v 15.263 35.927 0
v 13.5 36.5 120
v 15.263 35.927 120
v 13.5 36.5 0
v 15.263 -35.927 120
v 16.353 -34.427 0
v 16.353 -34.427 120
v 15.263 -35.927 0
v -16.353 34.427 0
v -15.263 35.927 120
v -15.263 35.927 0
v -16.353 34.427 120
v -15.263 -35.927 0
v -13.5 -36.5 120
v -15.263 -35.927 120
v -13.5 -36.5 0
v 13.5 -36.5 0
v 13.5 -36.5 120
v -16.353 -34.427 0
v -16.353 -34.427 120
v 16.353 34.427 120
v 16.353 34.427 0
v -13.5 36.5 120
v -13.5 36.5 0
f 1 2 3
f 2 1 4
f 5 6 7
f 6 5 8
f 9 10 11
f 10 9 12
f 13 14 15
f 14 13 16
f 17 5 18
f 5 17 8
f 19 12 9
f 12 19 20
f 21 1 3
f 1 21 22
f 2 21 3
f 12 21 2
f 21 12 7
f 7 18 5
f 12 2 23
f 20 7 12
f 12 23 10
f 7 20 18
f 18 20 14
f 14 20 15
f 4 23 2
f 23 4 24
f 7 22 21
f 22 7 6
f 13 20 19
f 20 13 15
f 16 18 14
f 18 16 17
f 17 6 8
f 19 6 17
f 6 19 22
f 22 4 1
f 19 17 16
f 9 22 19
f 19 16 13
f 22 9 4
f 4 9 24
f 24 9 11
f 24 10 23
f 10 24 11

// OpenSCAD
// file: roundbox.scad
module roundedRectUp(size, radius)
{
    x = size[0];
    y = size[1];
    z = size[2];

    linear_extrude(height=z)
    hull()
    {
        // place 4 circles in the corners, with the given radius
        translate([(-x/2)+(radius/2), (-y/2)+(radius/2), 0])
        circle(r=radius);

        translate([(x/2)-(radius/2), (-y/2)+(radius/2), 0])
        circle(r=radius);

        translate([(-x/2)+(radius/2), (y/2)-(radius/2), 0])
        circle(r=radius);

        translate([(x/2)-(radius/2), (y/2)-(radius/2), 0])
        circle(r=radius);
    }
}

module roundedRect(size, radius, center=false) 
{
    if( center) {
        translate([ 0, 0, -size[2]/2])
        roundedRectUp(size, radius);
    }
    else {
        roundedRectUp(size, radius);
    }
}


// example
roundedRect([20, 10, 1], 3, true);
// main file
use <roundbox.scad>

module battery_case() {
battery_w = 70;
battery_l = 30;
battery_h = 120;

color("white")
rotate([0, 0, 90])
roundedRect([battery_w, battery_l, battery_h], 3);
//cube([battery_w, battery_l, battery_h]);

}

module battery( mat=false, hole=false, equip=false) {
  if( hole) {
      battery_case();
  }

  if( equip) {
      battery_case();
  }
}

difference() {
//battery(mat=true);
battery(hole=true);
}

battery(equip=true);
